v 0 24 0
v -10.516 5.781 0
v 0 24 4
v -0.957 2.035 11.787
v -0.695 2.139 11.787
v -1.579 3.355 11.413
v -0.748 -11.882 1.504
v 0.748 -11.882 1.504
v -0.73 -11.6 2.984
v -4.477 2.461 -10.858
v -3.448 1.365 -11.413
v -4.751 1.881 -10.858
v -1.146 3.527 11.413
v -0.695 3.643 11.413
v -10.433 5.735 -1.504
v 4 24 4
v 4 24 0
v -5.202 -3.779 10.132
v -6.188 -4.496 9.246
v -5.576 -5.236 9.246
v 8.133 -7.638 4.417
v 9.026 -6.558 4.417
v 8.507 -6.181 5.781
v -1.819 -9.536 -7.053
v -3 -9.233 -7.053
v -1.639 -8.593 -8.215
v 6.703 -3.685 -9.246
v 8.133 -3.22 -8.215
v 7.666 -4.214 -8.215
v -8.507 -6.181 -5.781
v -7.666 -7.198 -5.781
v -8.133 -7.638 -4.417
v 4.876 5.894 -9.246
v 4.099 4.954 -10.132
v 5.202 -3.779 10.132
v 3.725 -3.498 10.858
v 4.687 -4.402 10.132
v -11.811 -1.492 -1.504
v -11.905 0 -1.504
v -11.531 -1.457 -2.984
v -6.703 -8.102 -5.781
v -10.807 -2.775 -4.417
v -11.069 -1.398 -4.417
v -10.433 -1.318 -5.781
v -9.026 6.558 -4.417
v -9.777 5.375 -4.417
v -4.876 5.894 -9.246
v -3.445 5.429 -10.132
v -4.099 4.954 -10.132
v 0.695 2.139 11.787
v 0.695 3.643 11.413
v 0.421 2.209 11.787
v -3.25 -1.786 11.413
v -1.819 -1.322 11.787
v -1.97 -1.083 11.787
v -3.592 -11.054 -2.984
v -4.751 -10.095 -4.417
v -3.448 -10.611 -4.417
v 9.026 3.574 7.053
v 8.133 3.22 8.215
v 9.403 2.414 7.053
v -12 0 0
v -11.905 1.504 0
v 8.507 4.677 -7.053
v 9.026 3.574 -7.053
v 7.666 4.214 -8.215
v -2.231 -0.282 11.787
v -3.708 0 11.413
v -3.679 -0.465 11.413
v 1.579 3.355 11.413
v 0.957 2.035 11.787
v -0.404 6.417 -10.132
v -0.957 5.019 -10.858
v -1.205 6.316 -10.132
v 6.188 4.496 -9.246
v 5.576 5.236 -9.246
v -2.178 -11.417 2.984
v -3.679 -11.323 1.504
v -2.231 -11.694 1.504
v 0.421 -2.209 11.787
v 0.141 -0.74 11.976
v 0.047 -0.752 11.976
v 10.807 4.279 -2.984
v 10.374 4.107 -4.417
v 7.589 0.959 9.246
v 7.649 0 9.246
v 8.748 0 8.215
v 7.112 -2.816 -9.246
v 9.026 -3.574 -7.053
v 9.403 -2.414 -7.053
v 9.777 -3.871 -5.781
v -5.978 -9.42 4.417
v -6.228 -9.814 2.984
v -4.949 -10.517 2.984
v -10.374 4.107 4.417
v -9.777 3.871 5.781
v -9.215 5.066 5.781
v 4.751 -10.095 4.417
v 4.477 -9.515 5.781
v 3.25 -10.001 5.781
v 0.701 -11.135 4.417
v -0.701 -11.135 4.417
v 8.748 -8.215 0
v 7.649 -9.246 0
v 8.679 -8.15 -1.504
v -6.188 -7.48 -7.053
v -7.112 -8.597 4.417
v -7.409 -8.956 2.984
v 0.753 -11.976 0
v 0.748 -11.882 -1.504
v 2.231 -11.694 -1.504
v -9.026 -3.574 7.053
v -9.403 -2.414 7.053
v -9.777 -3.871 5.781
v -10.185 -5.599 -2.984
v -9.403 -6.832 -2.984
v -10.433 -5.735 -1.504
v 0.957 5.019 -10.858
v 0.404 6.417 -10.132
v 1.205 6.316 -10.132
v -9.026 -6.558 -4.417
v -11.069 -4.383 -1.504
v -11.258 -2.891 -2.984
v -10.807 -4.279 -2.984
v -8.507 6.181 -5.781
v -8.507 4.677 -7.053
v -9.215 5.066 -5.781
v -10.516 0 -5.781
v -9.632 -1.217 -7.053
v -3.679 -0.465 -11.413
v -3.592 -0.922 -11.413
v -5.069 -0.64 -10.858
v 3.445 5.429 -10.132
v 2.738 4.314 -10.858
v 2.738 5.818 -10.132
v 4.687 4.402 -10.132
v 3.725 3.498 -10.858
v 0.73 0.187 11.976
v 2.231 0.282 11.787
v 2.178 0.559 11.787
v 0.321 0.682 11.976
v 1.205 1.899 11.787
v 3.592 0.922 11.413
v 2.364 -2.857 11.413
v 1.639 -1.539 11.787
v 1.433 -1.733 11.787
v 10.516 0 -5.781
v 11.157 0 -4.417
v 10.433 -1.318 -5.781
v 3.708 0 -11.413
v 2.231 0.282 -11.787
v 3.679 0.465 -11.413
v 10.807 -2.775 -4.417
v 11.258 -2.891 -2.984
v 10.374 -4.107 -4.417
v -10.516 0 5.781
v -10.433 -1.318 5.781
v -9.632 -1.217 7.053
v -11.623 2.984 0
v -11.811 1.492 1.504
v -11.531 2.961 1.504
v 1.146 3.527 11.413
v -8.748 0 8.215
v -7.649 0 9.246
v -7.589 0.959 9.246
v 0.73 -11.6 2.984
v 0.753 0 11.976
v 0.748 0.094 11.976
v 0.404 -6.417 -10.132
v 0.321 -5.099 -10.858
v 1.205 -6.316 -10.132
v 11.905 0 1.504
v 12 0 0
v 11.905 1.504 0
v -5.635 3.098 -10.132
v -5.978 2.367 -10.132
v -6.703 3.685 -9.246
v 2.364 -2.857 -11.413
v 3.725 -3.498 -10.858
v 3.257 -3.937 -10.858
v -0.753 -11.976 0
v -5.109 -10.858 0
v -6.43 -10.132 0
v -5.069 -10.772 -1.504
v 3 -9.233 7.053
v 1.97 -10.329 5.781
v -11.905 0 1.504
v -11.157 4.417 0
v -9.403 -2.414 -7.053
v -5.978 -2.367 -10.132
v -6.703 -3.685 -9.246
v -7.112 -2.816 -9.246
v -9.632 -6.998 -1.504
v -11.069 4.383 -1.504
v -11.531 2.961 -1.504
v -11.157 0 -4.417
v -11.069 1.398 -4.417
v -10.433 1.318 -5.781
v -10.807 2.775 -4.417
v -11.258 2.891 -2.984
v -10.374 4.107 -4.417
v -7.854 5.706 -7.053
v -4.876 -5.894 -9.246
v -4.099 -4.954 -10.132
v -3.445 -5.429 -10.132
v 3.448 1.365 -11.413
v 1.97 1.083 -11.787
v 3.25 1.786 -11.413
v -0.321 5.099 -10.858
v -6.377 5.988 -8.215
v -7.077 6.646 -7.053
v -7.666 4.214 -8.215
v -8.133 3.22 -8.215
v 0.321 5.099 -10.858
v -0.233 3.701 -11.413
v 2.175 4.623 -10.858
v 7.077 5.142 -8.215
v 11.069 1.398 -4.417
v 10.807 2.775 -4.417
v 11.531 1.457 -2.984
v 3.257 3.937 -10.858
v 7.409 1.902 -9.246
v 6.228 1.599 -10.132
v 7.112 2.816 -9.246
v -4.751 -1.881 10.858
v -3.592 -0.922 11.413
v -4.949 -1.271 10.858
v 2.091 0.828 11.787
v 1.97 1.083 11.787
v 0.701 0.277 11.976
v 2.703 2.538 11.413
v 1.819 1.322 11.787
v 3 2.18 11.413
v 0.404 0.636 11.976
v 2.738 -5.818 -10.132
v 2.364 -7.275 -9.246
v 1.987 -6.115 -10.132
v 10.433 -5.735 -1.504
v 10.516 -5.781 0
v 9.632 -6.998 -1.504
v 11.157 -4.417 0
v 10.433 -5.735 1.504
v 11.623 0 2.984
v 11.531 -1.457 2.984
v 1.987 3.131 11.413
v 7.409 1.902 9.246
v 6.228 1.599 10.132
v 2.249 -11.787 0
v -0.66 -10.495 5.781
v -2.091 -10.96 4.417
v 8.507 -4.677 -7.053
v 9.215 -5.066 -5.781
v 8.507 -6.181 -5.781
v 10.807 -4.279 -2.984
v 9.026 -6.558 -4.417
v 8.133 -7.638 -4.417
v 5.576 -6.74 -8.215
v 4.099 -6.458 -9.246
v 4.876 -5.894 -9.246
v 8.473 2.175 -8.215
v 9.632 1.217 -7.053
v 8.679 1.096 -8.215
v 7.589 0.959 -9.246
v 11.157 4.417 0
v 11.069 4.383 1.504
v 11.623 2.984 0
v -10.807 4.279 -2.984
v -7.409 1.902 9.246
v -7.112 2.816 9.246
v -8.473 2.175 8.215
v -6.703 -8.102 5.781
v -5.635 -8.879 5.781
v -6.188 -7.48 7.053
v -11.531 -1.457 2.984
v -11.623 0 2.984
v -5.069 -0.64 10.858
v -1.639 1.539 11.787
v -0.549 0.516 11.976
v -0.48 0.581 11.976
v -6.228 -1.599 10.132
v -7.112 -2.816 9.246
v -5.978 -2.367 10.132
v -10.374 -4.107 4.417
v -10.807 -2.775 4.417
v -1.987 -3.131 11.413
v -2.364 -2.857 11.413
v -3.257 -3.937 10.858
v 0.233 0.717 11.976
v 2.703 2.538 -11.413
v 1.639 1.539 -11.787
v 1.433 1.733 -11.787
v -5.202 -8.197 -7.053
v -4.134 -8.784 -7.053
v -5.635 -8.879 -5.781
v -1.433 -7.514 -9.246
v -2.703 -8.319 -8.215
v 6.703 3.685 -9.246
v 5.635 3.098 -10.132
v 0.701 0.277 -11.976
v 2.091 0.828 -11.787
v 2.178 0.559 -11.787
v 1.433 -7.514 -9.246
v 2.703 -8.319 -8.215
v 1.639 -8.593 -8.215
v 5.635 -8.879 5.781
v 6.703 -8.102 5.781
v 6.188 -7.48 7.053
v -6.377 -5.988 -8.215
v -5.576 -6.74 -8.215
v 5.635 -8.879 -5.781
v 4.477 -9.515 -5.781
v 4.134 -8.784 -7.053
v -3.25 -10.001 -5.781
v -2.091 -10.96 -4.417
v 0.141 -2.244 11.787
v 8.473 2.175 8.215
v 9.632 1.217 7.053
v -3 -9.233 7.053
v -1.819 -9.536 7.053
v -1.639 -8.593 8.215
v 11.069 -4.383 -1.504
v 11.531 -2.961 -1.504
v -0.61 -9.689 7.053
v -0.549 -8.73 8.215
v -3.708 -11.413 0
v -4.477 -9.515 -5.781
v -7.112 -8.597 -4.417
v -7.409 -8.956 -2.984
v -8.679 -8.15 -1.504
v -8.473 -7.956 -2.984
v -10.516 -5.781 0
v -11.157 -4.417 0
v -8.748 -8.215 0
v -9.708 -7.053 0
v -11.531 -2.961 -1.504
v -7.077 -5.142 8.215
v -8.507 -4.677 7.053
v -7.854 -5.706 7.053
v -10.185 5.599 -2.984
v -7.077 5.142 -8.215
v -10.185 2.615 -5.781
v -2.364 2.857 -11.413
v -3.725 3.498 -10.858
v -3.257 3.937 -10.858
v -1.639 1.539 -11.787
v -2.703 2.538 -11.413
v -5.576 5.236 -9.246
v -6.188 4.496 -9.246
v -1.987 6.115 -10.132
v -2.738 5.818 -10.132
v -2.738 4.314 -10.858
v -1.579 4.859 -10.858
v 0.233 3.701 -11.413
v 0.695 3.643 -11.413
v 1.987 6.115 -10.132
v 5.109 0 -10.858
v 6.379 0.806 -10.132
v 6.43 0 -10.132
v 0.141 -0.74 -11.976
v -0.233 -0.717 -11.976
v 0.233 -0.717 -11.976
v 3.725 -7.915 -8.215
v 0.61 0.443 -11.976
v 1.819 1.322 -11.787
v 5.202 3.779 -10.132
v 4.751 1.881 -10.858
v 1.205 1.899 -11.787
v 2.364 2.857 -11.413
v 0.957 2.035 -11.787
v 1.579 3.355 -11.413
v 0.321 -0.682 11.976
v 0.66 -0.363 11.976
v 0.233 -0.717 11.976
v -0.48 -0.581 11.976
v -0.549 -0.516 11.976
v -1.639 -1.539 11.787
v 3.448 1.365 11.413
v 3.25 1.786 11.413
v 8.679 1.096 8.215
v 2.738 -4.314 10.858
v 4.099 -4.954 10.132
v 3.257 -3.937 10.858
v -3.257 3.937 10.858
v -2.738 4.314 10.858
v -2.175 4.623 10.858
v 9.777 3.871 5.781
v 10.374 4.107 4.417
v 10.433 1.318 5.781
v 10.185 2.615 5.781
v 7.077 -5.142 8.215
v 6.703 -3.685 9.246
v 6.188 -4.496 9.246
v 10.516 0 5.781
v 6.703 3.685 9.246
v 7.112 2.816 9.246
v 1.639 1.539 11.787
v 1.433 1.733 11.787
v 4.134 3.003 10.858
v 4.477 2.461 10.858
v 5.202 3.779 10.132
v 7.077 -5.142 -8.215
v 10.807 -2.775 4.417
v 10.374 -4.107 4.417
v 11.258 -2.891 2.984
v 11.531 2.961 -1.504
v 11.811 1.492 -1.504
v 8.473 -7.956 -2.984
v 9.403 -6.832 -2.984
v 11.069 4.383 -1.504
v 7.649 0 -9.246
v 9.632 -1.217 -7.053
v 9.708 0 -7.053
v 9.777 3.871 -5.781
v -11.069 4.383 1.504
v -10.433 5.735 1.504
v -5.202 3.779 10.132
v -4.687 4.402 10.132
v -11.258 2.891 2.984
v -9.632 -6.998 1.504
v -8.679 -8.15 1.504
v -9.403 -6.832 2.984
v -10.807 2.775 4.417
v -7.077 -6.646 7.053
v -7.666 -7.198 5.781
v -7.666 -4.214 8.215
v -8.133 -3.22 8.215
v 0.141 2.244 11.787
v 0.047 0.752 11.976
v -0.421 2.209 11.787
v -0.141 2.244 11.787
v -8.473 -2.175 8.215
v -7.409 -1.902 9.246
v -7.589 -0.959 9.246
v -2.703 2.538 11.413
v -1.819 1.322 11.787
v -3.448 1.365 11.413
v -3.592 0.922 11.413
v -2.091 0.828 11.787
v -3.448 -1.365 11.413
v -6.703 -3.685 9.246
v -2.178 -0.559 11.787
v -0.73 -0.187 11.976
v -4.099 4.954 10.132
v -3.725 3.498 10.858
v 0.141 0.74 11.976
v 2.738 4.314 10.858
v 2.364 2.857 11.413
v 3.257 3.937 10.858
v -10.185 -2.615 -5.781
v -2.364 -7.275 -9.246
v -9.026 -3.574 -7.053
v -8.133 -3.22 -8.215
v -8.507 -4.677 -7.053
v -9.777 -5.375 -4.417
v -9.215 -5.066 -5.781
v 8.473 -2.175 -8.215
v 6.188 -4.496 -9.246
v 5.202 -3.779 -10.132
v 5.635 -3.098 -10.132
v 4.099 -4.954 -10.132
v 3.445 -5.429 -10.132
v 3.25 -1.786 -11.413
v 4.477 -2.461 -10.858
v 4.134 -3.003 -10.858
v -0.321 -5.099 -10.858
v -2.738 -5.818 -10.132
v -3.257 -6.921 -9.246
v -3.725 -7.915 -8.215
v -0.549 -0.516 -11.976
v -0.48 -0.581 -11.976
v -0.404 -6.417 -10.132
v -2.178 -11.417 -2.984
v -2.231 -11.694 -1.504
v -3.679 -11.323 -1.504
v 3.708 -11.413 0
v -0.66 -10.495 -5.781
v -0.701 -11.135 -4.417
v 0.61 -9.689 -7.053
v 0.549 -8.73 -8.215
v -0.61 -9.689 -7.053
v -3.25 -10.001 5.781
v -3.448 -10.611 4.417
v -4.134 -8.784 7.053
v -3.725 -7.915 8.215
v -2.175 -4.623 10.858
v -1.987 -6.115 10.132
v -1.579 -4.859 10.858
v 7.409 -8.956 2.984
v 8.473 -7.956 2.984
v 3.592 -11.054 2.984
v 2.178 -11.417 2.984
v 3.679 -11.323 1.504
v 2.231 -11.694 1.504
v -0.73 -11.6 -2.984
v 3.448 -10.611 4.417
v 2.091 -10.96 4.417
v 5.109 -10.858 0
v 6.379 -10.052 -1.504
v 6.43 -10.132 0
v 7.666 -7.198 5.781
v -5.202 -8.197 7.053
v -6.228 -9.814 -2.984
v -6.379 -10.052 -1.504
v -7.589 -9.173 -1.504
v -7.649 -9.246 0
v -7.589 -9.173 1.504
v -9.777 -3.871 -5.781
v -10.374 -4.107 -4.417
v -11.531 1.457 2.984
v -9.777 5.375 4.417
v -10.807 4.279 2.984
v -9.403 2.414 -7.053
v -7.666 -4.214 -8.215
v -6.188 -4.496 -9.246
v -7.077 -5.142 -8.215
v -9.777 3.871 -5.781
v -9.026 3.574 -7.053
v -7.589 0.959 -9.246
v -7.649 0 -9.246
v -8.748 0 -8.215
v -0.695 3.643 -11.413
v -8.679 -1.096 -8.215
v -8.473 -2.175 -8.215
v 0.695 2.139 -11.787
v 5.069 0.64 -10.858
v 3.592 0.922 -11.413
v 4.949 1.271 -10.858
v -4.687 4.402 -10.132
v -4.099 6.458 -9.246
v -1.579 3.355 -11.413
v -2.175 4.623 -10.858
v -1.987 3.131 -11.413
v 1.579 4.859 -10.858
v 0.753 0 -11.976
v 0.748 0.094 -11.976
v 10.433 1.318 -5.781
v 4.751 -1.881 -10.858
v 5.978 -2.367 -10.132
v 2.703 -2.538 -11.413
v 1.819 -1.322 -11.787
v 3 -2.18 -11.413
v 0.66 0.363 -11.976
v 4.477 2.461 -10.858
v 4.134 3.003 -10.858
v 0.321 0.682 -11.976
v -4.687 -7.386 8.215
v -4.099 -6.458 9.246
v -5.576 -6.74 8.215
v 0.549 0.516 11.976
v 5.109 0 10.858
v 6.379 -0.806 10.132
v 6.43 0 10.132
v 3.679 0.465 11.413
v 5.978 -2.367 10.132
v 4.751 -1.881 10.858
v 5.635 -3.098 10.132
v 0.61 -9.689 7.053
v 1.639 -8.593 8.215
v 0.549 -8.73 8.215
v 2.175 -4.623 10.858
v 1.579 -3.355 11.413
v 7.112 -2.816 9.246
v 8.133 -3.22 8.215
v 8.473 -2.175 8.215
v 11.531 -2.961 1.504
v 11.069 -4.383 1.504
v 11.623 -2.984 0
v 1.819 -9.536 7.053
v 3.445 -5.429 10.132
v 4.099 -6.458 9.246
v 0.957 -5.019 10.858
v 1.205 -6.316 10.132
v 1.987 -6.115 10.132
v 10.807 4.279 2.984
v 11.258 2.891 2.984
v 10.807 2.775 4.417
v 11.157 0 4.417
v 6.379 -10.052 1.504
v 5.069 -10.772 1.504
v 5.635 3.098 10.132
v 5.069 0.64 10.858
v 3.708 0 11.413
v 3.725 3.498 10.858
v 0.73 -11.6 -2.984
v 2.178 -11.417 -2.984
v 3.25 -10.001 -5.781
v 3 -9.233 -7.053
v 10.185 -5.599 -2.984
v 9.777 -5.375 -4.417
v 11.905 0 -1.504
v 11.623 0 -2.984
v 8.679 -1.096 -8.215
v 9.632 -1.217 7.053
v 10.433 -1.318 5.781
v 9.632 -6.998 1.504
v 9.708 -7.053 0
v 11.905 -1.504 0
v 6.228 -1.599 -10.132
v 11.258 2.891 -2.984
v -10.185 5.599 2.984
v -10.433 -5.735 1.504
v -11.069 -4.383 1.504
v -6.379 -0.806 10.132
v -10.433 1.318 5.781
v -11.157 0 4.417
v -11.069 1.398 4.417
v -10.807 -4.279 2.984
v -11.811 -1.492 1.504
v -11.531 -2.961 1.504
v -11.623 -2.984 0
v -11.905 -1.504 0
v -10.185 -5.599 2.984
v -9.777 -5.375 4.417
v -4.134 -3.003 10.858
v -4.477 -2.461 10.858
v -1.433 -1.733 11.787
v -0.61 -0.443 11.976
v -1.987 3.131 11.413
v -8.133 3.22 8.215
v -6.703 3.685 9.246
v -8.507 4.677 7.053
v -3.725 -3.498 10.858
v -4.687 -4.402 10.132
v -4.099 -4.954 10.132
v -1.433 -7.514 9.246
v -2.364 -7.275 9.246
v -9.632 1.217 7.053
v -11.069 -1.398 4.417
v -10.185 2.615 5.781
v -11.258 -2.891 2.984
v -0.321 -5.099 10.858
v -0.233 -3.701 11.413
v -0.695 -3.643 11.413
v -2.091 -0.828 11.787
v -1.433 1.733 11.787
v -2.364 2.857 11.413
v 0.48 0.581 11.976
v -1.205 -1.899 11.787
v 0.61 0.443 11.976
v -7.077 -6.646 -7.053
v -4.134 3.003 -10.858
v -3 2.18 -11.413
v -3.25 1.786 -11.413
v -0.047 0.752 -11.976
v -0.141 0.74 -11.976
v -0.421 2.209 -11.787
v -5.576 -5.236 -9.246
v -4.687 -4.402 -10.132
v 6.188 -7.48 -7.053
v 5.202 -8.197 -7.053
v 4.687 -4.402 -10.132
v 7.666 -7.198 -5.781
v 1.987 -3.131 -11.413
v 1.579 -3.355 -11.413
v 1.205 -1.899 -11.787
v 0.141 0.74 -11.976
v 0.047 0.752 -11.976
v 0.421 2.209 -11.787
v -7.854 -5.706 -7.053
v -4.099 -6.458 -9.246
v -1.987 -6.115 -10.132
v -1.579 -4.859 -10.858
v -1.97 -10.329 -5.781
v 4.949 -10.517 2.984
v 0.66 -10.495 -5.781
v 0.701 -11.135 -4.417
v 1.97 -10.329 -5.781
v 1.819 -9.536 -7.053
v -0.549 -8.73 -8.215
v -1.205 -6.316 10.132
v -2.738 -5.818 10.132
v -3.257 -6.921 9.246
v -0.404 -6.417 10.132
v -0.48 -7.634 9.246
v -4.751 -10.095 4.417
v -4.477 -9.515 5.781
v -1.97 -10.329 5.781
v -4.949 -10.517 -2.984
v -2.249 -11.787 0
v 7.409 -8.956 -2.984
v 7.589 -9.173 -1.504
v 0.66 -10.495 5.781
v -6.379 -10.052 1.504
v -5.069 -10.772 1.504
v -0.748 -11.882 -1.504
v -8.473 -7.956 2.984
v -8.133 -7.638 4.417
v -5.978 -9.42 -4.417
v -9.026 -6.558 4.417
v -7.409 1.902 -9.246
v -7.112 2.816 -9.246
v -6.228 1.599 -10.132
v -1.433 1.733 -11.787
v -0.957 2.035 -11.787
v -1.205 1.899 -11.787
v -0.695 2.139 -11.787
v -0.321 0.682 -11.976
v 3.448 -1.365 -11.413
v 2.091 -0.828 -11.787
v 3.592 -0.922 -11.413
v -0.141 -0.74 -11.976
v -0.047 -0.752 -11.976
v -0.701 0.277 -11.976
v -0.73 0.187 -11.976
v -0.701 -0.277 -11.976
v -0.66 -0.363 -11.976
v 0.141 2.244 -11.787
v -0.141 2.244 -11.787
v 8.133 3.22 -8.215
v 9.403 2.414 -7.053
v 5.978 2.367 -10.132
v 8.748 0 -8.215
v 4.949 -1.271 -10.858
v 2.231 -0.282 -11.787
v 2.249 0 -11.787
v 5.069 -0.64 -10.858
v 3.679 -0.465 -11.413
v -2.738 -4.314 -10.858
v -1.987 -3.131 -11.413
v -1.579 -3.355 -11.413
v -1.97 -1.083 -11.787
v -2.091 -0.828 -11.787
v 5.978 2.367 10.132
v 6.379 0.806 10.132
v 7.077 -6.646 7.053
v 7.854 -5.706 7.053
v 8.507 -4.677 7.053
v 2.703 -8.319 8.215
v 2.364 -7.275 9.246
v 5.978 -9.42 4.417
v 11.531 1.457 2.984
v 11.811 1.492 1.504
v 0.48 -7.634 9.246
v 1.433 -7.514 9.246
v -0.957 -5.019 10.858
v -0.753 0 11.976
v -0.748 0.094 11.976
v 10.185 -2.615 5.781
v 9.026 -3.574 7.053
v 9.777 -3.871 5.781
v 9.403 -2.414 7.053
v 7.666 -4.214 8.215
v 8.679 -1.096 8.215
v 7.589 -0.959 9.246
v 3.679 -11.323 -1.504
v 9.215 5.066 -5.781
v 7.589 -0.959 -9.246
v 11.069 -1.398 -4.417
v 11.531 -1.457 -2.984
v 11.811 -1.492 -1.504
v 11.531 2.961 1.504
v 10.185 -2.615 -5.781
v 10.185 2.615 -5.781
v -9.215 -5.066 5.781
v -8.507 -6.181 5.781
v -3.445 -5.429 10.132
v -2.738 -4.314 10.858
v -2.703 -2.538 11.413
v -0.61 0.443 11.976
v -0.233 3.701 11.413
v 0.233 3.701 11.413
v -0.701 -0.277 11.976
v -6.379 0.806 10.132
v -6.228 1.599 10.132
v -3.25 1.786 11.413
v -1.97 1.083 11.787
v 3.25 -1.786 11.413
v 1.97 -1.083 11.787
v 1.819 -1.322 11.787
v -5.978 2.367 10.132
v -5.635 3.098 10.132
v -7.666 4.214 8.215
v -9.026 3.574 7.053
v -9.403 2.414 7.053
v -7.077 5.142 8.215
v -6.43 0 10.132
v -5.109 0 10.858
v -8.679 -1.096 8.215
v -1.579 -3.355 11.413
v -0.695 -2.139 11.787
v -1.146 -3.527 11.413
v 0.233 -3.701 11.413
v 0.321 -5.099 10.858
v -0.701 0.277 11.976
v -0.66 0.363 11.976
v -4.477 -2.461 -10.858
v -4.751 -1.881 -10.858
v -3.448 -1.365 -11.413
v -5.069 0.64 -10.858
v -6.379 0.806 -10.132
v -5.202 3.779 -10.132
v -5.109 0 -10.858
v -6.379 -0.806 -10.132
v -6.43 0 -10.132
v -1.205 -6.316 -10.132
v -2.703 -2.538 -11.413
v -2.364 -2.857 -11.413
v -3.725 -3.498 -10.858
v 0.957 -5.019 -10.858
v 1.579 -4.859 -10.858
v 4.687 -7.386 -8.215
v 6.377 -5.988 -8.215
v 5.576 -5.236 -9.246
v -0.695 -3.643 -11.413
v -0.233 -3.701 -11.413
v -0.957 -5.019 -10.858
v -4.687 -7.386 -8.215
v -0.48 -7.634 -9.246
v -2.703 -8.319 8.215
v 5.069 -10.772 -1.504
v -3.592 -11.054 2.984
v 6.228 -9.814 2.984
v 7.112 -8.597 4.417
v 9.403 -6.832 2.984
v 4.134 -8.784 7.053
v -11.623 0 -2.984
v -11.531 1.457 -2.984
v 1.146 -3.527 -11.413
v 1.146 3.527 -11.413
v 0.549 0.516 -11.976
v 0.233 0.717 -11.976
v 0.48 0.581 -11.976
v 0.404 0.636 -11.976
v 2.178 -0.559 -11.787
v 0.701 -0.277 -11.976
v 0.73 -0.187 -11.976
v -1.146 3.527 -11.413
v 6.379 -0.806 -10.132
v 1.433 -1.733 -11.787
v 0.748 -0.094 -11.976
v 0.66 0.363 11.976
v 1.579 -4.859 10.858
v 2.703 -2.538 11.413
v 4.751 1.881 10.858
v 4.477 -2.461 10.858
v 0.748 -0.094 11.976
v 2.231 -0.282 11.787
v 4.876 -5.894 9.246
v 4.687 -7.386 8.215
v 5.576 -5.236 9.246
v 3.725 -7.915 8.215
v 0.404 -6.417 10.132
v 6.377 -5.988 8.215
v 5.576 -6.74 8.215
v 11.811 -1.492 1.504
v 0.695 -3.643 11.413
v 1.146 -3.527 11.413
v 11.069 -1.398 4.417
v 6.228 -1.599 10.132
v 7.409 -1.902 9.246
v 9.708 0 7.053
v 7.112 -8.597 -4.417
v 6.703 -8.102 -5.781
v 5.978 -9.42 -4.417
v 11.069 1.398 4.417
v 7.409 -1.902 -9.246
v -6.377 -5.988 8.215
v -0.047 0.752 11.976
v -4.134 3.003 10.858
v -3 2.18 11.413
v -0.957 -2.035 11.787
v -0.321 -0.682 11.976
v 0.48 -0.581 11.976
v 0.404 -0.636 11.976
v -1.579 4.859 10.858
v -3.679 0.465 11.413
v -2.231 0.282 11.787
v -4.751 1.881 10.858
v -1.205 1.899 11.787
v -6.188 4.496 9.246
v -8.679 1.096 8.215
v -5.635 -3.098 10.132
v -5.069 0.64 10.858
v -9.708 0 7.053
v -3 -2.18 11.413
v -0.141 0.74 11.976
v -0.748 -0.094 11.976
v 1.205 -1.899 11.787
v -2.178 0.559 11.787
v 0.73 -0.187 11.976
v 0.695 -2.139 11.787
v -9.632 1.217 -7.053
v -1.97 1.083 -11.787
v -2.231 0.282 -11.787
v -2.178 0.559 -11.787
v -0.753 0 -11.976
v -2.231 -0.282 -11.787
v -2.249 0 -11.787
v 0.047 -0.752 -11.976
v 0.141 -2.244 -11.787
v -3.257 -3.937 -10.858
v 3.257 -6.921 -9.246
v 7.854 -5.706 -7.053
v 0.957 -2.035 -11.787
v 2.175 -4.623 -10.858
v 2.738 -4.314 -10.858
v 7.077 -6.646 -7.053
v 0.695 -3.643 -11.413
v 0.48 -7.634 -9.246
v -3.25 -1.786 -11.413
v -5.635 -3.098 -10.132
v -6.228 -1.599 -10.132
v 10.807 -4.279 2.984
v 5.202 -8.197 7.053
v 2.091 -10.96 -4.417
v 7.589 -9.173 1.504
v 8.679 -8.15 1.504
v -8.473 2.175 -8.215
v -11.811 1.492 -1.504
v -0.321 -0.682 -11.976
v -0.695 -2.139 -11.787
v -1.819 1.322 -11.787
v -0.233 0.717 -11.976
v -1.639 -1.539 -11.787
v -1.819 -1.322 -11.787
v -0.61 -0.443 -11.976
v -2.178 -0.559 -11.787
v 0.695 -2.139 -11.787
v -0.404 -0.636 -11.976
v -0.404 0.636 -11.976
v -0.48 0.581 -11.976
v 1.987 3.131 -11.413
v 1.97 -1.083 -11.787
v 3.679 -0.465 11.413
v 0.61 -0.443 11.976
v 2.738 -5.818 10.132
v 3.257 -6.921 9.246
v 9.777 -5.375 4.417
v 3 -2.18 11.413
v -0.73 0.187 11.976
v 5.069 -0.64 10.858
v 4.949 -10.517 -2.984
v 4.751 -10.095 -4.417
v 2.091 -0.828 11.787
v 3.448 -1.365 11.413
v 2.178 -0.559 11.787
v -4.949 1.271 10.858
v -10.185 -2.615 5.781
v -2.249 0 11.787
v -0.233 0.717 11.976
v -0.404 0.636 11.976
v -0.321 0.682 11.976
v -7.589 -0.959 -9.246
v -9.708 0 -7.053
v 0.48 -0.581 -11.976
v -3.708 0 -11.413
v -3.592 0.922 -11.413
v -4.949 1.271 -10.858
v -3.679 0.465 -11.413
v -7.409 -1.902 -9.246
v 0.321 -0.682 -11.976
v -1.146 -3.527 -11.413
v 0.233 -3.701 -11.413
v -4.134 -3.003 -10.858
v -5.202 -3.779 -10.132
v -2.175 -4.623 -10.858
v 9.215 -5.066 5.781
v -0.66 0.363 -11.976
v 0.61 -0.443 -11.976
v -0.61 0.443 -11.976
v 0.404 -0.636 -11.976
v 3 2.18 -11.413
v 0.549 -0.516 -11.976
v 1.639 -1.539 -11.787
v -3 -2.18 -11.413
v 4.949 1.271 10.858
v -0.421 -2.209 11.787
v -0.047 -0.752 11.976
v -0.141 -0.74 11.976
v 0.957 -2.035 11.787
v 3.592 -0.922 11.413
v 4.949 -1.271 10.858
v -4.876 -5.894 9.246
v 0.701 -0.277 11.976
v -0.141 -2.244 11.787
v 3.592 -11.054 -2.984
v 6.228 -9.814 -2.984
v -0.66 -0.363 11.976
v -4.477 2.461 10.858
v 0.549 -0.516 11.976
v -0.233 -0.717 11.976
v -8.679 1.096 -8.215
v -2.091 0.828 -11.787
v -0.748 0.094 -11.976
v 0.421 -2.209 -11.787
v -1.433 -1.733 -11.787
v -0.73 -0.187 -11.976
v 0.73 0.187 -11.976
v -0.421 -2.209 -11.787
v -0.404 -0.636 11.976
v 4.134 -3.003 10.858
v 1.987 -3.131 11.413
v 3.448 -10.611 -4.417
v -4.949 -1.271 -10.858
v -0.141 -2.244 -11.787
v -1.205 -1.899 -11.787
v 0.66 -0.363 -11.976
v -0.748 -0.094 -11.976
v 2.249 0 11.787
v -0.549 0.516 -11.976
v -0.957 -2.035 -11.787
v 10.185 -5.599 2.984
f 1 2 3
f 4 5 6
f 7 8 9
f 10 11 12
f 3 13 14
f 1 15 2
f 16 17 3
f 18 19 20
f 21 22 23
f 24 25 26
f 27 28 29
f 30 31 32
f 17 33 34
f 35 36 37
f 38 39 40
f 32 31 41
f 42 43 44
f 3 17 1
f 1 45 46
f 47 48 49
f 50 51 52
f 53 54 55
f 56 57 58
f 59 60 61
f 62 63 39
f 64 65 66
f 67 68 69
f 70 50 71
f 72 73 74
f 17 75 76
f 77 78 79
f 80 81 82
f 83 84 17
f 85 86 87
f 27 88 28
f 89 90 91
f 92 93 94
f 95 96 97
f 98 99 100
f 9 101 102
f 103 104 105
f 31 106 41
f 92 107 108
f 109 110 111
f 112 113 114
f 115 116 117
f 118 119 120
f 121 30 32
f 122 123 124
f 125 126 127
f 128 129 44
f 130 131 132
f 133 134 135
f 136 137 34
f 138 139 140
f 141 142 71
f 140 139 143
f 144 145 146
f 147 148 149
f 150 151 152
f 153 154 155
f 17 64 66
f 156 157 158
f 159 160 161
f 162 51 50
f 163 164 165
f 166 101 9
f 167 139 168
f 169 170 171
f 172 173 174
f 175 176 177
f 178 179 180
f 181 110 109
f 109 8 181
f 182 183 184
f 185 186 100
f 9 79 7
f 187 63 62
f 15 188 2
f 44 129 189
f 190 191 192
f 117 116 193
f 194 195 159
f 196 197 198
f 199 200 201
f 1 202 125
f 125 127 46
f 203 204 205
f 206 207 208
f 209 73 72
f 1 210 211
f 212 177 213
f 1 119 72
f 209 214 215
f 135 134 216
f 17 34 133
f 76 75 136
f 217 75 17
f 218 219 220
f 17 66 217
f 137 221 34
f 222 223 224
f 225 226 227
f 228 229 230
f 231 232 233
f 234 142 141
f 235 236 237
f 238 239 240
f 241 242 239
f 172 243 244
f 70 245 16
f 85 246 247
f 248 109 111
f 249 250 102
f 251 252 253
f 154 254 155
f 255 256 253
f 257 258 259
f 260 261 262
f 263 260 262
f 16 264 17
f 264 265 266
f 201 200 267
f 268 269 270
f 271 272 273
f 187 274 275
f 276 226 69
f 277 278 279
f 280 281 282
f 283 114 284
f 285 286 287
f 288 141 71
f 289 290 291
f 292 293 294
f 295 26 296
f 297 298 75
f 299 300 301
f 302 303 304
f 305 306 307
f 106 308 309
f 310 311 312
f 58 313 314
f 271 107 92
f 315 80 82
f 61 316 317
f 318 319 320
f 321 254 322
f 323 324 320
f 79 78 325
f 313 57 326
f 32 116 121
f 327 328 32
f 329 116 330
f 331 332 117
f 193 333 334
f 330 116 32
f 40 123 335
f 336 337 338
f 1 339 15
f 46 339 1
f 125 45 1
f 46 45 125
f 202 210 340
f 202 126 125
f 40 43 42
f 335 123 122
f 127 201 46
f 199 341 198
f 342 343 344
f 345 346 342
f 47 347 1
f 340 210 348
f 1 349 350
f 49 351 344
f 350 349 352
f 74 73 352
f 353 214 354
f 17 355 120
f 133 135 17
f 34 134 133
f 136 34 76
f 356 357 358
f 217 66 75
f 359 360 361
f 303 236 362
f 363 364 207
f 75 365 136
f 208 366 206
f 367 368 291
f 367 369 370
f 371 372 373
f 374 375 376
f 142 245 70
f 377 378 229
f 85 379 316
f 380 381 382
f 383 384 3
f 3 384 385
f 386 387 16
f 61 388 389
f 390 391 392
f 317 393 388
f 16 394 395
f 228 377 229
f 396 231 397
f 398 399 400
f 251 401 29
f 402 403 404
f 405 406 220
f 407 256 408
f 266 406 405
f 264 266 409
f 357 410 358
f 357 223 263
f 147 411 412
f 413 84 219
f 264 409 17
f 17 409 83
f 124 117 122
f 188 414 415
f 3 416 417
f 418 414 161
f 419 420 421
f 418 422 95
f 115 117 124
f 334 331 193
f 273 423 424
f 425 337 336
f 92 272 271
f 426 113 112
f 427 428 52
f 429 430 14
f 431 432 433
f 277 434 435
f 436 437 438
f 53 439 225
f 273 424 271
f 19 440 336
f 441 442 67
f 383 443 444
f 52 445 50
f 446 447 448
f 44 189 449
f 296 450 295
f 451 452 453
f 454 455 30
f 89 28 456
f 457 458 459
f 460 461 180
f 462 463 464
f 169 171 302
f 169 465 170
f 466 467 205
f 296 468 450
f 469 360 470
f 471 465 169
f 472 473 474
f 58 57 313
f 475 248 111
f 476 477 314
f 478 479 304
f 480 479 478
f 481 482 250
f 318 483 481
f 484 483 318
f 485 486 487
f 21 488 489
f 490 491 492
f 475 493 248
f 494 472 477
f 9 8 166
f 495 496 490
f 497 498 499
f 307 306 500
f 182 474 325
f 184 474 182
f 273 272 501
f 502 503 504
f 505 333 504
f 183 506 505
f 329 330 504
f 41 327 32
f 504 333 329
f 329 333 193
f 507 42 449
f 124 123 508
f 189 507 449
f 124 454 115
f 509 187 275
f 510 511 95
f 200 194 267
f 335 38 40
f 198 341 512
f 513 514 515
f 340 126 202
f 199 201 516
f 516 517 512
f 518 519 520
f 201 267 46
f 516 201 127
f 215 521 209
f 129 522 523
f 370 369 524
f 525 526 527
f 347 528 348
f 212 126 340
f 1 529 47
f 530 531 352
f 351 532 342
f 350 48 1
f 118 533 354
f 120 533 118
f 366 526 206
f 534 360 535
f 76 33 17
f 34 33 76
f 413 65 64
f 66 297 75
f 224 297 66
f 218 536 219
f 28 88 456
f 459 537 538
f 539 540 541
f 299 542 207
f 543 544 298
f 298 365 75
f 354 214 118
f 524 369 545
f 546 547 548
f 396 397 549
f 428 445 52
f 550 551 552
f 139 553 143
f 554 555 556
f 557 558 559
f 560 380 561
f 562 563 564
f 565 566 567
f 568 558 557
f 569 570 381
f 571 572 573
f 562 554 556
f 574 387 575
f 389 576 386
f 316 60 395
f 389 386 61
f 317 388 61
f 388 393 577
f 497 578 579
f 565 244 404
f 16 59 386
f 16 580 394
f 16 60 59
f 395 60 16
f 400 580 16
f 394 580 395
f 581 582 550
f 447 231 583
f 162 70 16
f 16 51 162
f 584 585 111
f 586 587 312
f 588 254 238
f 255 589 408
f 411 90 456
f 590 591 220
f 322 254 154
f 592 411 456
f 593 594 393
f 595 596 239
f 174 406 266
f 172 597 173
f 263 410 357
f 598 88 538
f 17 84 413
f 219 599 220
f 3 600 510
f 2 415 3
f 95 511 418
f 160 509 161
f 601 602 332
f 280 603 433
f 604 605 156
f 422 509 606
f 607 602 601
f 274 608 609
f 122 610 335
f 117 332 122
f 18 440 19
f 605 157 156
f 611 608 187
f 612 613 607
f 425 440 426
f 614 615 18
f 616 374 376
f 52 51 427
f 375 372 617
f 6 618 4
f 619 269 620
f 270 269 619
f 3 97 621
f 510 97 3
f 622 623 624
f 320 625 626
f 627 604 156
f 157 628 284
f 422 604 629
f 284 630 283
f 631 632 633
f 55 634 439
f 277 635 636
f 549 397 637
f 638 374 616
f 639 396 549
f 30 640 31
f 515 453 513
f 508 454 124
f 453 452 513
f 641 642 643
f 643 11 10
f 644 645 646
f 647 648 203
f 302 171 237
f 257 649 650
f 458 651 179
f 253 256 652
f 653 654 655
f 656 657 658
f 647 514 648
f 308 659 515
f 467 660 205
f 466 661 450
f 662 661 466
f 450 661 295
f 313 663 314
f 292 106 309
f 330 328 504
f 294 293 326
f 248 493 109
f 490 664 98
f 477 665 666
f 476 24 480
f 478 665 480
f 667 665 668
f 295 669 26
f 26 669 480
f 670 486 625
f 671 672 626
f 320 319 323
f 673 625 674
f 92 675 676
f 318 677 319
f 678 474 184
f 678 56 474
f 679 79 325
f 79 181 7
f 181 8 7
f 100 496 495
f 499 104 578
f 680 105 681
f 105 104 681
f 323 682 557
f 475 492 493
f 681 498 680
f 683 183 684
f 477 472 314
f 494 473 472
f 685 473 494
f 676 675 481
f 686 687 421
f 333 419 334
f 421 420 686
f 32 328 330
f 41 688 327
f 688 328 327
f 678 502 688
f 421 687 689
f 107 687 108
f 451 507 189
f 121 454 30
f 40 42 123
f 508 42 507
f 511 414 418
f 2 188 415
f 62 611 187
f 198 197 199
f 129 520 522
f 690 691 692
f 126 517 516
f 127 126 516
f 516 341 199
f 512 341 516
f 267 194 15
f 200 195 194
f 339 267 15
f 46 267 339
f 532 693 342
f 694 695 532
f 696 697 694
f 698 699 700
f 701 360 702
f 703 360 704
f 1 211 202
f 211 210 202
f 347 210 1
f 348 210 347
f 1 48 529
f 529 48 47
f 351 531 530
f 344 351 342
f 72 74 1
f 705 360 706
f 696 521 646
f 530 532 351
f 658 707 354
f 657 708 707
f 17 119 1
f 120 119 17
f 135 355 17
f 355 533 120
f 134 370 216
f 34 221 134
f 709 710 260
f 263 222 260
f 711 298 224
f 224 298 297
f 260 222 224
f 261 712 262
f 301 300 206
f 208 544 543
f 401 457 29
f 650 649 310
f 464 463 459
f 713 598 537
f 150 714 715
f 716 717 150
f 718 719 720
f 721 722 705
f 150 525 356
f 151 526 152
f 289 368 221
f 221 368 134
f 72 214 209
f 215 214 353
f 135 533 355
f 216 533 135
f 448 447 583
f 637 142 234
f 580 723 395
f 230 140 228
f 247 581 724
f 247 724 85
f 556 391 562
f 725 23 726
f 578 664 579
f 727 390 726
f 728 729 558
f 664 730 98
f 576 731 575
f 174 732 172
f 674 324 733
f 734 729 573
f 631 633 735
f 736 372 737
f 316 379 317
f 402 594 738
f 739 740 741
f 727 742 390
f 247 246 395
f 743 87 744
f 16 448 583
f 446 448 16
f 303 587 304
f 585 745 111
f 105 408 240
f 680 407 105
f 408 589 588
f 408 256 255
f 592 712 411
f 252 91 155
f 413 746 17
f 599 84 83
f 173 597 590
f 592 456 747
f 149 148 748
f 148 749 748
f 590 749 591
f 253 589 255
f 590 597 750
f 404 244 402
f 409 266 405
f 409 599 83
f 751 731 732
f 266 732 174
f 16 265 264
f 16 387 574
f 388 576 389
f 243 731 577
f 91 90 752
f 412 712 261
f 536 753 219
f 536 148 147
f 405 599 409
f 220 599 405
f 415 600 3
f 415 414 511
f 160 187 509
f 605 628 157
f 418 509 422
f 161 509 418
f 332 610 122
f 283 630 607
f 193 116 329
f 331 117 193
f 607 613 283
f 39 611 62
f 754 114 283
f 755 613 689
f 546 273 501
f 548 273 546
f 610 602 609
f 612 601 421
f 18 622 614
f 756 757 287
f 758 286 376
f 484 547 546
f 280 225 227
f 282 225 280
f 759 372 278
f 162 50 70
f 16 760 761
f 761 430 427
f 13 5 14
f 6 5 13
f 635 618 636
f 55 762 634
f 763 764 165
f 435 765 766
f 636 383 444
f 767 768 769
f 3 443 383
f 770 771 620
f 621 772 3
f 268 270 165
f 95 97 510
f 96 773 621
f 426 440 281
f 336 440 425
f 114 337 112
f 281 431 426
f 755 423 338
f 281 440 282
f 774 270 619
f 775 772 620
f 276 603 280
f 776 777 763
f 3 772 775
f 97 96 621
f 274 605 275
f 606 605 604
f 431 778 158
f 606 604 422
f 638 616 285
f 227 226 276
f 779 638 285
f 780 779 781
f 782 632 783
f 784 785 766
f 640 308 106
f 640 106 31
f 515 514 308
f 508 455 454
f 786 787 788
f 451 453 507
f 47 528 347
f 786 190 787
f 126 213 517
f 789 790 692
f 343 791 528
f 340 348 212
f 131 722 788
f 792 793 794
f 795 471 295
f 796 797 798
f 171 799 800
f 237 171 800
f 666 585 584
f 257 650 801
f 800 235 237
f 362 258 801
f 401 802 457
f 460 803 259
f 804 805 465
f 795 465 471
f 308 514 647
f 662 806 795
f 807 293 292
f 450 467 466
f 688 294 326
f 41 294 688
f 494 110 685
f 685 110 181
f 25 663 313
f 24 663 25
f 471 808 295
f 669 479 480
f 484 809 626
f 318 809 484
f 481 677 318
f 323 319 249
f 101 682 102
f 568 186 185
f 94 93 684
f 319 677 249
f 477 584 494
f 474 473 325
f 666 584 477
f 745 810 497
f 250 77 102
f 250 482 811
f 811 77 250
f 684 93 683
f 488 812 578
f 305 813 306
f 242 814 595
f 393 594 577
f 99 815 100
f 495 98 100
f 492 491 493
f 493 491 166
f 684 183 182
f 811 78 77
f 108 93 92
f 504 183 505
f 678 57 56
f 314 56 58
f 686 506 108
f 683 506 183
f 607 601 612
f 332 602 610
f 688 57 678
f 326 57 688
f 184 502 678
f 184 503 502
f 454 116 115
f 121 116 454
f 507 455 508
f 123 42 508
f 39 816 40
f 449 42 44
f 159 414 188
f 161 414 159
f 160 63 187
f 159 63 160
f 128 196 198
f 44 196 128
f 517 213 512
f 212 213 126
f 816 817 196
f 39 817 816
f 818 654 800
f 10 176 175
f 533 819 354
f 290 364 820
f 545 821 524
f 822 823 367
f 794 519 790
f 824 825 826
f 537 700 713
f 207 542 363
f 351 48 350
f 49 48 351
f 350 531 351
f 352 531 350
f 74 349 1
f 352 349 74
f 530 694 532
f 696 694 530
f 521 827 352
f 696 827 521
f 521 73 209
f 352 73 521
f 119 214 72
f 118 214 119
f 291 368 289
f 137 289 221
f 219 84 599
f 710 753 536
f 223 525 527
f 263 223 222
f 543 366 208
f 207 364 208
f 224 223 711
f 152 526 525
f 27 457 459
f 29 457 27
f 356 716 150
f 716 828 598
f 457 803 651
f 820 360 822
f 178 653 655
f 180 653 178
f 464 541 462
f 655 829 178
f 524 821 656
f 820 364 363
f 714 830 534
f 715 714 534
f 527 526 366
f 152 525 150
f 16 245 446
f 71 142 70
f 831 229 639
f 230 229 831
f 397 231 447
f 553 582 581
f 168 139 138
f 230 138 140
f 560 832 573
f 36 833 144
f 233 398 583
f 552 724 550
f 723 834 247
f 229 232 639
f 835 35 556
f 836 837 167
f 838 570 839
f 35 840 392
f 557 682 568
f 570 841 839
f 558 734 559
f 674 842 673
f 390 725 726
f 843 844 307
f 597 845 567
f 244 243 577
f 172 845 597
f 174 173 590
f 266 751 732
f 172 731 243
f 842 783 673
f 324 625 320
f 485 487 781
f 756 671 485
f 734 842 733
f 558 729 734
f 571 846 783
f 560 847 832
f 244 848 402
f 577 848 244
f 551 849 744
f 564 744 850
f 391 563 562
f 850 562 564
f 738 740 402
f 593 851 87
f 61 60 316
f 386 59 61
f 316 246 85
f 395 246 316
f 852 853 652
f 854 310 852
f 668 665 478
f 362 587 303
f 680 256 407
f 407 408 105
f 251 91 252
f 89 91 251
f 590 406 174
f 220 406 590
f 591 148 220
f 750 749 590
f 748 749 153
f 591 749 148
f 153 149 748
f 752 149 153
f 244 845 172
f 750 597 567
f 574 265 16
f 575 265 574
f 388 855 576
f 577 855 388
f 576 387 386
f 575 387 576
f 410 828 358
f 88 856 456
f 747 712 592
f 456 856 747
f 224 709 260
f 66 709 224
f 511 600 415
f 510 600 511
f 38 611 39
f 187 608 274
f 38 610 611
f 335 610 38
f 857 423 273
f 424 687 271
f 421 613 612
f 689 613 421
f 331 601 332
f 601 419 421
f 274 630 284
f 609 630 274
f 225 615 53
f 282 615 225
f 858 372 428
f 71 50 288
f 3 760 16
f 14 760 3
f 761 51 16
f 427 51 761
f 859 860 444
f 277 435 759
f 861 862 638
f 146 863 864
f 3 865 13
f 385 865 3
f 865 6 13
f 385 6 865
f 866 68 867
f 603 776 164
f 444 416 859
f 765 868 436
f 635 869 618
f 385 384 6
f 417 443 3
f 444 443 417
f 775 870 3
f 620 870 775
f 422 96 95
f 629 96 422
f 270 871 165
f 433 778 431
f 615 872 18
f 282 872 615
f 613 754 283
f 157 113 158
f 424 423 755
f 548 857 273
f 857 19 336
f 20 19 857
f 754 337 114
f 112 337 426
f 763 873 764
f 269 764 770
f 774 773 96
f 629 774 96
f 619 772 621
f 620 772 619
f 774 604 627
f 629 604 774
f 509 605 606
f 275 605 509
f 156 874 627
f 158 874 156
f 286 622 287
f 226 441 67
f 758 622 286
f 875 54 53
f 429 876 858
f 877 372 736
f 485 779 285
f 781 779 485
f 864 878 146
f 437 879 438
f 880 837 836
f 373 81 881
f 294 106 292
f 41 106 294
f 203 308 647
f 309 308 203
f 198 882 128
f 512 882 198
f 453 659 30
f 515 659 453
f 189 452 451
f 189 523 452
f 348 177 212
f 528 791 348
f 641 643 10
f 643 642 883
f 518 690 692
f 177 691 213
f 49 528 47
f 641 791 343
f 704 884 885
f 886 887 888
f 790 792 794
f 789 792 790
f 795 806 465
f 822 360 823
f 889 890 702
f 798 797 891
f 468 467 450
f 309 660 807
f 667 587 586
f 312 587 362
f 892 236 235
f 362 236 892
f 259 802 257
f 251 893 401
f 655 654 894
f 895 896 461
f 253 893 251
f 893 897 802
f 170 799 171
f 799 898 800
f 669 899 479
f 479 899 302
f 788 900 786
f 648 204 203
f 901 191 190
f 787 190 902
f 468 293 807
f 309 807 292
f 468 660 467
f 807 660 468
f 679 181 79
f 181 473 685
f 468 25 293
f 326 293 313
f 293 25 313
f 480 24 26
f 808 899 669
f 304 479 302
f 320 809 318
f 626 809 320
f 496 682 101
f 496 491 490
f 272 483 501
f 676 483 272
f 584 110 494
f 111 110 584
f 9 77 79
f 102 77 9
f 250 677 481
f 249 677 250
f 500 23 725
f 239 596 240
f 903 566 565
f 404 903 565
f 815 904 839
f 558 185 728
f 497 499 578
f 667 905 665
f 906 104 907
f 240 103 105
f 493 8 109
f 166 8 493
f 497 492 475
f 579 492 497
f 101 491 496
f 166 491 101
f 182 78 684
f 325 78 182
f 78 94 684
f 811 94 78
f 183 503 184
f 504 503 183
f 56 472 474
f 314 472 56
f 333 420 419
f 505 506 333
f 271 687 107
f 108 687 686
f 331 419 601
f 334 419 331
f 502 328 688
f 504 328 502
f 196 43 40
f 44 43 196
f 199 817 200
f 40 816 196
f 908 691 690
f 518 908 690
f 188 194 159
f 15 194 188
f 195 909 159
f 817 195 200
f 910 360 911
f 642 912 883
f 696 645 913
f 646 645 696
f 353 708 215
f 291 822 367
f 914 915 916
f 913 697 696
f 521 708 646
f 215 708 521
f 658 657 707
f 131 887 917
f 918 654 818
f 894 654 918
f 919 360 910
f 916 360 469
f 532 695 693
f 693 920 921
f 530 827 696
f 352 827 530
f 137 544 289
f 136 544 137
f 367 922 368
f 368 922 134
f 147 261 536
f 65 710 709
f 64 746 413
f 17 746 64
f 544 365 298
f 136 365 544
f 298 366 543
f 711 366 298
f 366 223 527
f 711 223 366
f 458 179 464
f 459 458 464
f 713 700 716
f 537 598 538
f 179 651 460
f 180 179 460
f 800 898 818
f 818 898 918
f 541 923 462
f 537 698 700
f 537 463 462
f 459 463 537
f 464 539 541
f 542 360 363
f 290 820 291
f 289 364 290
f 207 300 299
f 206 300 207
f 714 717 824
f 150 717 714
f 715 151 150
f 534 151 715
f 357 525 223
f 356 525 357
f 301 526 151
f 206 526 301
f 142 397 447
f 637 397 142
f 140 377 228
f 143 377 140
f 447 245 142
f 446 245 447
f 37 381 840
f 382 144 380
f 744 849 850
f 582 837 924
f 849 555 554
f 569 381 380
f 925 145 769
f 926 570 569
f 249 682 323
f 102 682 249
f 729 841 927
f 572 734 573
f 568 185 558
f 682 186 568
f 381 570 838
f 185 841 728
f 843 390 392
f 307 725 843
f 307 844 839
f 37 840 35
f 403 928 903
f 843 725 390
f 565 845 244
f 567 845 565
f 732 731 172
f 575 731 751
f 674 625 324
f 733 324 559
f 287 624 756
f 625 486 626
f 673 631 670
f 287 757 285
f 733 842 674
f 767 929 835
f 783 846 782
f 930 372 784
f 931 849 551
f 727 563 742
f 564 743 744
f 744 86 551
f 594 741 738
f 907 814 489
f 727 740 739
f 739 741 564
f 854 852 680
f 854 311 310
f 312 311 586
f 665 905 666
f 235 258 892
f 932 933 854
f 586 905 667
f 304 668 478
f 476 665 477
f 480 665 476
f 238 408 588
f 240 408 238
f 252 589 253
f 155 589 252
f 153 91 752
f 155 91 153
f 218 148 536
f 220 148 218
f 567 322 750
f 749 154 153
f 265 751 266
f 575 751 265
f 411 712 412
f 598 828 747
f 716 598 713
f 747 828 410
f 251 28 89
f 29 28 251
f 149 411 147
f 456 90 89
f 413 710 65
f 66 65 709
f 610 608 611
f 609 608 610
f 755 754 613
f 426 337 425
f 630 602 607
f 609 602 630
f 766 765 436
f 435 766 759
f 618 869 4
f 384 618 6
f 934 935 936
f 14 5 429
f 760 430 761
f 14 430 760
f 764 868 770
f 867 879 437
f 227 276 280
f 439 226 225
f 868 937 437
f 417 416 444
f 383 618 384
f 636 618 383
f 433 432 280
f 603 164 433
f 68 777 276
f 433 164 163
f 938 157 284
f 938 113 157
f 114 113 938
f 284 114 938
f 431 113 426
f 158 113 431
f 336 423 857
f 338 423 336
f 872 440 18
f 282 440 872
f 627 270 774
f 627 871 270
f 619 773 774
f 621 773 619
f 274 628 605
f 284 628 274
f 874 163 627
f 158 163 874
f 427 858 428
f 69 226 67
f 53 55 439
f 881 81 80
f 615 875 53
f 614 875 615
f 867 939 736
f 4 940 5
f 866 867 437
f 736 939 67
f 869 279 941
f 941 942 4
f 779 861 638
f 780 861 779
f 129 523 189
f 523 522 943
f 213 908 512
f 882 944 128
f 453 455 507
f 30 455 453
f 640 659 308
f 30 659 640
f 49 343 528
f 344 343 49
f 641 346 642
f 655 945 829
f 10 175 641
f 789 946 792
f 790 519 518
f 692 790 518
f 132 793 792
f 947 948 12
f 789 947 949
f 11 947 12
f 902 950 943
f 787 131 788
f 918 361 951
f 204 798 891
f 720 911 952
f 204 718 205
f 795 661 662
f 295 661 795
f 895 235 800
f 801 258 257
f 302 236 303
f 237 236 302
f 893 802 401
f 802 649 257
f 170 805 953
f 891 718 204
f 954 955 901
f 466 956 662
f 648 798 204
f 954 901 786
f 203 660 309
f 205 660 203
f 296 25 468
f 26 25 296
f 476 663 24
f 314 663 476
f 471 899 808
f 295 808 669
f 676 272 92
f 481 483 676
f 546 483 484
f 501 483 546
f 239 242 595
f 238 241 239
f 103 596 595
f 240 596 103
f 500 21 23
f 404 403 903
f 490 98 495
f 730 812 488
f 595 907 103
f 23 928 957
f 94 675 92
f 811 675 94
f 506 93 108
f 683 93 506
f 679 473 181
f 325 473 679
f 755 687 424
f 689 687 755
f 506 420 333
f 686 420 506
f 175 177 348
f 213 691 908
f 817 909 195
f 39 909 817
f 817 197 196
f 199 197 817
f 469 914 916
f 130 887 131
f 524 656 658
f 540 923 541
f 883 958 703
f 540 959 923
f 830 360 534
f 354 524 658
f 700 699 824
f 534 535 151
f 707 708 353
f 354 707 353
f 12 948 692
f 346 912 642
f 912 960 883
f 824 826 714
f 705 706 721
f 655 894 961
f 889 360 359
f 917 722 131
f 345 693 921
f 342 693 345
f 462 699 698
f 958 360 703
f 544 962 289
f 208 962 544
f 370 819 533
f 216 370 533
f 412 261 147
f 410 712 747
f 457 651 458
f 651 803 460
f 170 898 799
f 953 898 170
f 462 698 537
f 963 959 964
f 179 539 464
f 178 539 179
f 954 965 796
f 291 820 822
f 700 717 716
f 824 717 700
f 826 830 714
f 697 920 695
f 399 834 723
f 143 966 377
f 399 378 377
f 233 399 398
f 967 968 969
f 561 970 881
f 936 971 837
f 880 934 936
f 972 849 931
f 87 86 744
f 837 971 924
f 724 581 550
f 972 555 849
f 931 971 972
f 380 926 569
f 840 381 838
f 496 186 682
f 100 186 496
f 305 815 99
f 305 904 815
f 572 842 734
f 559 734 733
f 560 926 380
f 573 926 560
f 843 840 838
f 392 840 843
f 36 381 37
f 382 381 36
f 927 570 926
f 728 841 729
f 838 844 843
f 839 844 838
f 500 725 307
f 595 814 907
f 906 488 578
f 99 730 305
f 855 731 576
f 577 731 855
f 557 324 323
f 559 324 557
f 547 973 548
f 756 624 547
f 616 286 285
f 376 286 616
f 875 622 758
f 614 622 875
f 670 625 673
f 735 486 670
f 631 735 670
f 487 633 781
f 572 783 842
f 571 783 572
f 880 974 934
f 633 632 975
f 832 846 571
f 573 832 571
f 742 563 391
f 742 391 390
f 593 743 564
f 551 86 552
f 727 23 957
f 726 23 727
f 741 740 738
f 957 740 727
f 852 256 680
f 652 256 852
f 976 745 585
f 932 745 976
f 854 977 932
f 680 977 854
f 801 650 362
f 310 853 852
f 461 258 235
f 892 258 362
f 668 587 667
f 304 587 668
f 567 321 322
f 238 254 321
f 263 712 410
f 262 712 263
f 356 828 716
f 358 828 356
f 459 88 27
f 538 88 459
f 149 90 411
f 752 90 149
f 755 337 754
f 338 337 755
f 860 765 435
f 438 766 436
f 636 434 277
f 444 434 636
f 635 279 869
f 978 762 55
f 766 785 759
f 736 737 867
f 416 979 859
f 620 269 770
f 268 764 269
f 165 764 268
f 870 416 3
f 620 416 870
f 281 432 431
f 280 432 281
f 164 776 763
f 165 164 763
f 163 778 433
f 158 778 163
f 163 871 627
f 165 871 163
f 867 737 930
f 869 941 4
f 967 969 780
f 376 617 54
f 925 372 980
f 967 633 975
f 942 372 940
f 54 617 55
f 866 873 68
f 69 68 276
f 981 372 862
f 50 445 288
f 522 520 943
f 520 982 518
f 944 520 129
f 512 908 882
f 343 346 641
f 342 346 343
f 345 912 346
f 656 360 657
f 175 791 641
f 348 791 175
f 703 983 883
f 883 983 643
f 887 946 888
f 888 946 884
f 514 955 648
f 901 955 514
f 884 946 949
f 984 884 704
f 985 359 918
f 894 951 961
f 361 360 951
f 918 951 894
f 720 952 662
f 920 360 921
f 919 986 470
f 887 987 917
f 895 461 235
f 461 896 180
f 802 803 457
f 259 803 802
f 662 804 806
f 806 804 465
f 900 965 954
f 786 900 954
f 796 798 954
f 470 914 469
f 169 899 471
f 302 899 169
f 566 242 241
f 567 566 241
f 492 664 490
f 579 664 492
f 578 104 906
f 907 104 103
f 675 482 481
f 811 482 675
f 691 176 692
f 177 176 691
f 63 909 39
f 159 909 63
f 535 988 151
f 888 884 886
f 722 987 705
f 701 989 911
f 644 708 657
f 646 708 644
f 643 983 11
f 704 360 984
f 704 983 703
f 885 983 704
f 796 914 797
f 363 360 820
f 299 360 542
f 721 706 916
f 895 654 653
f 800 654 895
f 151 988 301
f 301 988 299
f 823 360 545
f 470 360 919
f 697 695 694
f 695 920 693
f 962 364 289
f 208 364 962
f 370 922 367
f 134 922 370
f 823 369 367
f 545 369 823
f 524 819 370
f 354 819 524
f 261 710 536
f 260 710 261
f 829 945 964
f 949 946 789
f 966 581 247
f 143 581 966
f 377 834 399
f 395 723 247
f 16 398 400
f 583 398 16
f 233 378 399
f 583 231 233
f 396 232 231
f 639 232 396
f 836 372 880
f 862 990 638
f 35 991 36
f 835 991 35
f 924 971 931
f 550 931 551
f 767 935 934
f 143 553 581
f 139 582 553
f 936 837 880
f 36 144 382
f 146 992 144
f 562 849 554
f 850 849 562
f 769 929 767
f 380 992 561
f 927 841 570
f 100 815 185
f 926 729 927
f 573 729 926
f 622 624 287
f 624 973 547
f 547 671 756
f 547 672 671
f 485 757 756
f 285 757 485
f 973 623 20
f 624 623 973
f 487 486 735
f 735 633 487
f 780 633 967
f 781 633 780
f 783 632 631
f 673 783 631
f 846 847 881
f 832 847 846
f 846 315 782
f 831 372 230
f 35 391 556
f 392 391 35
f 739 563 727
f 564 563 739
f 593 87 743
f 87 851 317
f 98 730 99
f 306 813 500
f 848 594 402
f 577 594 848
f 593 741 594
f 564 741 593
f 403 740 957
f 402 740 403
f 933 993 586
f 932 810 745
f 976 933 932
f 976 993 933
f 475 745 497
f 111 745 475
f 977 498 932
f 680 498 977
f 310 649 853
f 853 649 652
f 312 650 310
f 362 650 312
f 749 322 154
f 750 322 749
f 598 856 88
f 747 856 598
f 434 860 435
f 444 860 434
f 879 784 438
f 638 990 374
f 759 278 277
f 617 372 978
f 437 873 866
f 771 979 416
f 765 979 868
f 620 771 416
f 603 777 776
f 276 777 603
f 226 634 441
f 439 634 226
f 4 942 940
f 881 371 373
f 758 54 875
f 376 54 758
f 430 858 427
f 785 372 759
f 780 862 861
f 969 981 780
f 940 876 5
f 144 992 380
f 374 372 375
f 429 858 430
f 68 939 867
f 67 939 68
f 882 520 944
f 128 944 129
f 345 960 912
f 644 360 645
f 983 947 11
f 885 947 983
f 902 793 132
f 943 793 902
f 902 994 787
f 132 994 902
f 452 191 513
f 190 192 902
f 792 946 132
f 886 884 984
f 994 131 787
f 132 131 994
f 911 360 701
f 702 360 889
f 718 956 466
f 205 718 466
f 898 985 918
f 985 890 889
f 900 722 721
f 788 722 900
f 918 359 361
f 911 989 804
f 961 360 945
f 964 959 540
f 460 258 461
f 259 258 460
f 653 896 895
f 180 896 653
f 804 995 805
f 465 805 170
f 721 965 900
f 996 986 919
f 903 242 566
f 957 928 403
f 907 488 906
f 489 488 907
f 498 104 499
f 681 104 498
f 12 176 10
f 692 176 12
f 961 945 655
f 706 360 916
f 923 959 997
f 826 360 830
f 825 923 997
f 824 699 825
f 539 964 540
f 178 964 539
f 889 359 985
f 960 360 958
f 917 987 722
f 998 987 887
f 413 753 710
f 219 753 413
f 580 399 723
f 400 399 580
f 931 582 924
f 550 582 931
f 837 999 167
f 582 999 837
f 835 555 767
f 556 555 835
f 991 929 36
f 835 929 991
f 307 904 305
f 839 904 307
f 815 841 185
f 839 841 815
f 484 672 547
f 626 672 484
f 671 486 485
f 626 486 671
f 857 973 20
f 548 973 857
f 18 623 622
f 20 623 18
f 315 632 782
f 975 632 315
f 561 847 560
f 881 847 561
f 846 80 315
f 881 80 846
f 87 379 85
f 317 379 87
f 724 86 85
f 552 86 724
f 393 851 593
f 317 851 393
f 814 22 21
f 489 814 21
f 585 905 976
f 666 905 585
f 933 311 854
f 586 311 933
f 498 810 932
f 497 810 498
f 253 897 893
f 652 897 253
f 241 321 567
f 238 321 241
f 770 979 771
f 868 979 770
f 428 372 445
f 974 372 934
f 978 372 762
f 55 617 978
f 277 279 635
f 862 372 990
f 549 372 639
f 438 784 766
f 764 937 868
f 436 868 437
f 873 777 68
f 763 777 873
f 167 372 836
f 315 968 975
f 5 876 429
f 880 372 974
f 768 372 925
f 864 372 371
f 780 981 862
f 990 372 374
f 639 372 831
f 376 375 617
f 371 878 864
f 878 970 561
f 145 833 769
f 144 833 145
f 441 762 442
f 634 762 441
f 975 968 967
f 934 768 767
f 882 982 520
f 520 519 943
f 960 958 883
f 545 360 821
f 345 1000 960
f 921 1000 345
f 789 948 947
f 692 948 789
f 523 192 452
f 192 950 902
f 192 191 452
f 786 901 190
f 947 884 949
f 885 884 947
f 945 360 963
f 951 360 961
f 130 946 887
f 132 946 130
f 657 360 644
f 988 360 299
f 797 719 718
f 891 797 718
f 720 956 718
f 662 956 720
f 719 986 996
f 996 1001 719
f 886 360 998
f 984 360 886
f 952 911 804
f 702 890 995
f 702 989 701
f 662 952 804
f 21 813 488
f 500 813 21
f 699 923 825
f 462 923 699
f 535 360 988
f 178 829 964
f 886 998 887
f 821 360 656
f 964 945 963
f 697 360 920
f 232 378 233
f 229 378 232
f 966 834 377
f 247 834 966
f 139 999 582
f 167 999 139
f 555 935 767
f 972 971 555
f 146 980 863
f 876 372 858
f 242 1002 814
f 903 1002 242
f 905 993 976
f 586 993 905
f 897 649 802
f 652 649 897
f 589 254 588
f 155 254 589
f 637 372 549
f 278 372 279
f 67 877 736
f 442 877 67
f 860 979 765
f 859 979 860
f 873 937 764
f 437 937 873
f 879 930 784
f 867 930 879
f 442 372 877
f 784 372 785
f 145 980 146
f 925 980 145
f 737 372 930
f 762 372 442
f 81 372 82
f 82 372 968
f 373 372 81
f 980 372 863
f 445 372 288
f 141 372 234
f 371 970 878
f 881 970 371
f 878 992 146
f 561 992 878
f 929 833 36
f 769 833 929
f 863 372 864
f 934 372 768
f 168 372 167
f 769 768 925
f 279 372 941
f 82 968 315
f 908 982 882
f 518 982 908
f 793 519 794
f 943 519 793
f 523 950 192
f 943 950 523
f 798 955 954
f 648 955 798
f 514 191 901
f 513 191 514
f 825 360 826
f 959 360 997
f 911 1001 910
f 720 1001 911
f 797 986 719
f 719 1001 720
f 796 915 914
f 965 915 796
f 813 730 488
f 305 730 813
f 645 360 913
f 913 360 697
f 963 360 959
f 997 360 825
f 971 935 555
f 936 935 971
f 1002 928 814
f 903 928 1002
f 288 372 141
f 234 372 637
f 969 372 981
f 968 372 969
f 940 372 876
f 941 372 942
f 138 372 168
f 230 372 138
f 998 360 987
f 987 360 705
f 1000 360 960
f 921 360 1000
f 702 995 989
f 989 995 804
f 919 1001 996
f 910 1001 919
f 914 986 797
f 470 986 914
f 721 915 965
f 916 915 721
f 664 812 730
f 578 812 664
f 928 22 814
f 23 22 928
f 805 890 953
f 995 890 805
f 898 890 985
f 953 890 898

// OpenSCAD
// See http://en.wikibooks.org/wiki/OpenSCAD_User_Manual/The_OpenSCAD_Language#hull
// and http://reprapide.fr/tutoriel-openscad-hull-et-minkowski

$fn=50;

hull() {
   translate([0,20,0]) cube(4);
   sphere(12);
}
